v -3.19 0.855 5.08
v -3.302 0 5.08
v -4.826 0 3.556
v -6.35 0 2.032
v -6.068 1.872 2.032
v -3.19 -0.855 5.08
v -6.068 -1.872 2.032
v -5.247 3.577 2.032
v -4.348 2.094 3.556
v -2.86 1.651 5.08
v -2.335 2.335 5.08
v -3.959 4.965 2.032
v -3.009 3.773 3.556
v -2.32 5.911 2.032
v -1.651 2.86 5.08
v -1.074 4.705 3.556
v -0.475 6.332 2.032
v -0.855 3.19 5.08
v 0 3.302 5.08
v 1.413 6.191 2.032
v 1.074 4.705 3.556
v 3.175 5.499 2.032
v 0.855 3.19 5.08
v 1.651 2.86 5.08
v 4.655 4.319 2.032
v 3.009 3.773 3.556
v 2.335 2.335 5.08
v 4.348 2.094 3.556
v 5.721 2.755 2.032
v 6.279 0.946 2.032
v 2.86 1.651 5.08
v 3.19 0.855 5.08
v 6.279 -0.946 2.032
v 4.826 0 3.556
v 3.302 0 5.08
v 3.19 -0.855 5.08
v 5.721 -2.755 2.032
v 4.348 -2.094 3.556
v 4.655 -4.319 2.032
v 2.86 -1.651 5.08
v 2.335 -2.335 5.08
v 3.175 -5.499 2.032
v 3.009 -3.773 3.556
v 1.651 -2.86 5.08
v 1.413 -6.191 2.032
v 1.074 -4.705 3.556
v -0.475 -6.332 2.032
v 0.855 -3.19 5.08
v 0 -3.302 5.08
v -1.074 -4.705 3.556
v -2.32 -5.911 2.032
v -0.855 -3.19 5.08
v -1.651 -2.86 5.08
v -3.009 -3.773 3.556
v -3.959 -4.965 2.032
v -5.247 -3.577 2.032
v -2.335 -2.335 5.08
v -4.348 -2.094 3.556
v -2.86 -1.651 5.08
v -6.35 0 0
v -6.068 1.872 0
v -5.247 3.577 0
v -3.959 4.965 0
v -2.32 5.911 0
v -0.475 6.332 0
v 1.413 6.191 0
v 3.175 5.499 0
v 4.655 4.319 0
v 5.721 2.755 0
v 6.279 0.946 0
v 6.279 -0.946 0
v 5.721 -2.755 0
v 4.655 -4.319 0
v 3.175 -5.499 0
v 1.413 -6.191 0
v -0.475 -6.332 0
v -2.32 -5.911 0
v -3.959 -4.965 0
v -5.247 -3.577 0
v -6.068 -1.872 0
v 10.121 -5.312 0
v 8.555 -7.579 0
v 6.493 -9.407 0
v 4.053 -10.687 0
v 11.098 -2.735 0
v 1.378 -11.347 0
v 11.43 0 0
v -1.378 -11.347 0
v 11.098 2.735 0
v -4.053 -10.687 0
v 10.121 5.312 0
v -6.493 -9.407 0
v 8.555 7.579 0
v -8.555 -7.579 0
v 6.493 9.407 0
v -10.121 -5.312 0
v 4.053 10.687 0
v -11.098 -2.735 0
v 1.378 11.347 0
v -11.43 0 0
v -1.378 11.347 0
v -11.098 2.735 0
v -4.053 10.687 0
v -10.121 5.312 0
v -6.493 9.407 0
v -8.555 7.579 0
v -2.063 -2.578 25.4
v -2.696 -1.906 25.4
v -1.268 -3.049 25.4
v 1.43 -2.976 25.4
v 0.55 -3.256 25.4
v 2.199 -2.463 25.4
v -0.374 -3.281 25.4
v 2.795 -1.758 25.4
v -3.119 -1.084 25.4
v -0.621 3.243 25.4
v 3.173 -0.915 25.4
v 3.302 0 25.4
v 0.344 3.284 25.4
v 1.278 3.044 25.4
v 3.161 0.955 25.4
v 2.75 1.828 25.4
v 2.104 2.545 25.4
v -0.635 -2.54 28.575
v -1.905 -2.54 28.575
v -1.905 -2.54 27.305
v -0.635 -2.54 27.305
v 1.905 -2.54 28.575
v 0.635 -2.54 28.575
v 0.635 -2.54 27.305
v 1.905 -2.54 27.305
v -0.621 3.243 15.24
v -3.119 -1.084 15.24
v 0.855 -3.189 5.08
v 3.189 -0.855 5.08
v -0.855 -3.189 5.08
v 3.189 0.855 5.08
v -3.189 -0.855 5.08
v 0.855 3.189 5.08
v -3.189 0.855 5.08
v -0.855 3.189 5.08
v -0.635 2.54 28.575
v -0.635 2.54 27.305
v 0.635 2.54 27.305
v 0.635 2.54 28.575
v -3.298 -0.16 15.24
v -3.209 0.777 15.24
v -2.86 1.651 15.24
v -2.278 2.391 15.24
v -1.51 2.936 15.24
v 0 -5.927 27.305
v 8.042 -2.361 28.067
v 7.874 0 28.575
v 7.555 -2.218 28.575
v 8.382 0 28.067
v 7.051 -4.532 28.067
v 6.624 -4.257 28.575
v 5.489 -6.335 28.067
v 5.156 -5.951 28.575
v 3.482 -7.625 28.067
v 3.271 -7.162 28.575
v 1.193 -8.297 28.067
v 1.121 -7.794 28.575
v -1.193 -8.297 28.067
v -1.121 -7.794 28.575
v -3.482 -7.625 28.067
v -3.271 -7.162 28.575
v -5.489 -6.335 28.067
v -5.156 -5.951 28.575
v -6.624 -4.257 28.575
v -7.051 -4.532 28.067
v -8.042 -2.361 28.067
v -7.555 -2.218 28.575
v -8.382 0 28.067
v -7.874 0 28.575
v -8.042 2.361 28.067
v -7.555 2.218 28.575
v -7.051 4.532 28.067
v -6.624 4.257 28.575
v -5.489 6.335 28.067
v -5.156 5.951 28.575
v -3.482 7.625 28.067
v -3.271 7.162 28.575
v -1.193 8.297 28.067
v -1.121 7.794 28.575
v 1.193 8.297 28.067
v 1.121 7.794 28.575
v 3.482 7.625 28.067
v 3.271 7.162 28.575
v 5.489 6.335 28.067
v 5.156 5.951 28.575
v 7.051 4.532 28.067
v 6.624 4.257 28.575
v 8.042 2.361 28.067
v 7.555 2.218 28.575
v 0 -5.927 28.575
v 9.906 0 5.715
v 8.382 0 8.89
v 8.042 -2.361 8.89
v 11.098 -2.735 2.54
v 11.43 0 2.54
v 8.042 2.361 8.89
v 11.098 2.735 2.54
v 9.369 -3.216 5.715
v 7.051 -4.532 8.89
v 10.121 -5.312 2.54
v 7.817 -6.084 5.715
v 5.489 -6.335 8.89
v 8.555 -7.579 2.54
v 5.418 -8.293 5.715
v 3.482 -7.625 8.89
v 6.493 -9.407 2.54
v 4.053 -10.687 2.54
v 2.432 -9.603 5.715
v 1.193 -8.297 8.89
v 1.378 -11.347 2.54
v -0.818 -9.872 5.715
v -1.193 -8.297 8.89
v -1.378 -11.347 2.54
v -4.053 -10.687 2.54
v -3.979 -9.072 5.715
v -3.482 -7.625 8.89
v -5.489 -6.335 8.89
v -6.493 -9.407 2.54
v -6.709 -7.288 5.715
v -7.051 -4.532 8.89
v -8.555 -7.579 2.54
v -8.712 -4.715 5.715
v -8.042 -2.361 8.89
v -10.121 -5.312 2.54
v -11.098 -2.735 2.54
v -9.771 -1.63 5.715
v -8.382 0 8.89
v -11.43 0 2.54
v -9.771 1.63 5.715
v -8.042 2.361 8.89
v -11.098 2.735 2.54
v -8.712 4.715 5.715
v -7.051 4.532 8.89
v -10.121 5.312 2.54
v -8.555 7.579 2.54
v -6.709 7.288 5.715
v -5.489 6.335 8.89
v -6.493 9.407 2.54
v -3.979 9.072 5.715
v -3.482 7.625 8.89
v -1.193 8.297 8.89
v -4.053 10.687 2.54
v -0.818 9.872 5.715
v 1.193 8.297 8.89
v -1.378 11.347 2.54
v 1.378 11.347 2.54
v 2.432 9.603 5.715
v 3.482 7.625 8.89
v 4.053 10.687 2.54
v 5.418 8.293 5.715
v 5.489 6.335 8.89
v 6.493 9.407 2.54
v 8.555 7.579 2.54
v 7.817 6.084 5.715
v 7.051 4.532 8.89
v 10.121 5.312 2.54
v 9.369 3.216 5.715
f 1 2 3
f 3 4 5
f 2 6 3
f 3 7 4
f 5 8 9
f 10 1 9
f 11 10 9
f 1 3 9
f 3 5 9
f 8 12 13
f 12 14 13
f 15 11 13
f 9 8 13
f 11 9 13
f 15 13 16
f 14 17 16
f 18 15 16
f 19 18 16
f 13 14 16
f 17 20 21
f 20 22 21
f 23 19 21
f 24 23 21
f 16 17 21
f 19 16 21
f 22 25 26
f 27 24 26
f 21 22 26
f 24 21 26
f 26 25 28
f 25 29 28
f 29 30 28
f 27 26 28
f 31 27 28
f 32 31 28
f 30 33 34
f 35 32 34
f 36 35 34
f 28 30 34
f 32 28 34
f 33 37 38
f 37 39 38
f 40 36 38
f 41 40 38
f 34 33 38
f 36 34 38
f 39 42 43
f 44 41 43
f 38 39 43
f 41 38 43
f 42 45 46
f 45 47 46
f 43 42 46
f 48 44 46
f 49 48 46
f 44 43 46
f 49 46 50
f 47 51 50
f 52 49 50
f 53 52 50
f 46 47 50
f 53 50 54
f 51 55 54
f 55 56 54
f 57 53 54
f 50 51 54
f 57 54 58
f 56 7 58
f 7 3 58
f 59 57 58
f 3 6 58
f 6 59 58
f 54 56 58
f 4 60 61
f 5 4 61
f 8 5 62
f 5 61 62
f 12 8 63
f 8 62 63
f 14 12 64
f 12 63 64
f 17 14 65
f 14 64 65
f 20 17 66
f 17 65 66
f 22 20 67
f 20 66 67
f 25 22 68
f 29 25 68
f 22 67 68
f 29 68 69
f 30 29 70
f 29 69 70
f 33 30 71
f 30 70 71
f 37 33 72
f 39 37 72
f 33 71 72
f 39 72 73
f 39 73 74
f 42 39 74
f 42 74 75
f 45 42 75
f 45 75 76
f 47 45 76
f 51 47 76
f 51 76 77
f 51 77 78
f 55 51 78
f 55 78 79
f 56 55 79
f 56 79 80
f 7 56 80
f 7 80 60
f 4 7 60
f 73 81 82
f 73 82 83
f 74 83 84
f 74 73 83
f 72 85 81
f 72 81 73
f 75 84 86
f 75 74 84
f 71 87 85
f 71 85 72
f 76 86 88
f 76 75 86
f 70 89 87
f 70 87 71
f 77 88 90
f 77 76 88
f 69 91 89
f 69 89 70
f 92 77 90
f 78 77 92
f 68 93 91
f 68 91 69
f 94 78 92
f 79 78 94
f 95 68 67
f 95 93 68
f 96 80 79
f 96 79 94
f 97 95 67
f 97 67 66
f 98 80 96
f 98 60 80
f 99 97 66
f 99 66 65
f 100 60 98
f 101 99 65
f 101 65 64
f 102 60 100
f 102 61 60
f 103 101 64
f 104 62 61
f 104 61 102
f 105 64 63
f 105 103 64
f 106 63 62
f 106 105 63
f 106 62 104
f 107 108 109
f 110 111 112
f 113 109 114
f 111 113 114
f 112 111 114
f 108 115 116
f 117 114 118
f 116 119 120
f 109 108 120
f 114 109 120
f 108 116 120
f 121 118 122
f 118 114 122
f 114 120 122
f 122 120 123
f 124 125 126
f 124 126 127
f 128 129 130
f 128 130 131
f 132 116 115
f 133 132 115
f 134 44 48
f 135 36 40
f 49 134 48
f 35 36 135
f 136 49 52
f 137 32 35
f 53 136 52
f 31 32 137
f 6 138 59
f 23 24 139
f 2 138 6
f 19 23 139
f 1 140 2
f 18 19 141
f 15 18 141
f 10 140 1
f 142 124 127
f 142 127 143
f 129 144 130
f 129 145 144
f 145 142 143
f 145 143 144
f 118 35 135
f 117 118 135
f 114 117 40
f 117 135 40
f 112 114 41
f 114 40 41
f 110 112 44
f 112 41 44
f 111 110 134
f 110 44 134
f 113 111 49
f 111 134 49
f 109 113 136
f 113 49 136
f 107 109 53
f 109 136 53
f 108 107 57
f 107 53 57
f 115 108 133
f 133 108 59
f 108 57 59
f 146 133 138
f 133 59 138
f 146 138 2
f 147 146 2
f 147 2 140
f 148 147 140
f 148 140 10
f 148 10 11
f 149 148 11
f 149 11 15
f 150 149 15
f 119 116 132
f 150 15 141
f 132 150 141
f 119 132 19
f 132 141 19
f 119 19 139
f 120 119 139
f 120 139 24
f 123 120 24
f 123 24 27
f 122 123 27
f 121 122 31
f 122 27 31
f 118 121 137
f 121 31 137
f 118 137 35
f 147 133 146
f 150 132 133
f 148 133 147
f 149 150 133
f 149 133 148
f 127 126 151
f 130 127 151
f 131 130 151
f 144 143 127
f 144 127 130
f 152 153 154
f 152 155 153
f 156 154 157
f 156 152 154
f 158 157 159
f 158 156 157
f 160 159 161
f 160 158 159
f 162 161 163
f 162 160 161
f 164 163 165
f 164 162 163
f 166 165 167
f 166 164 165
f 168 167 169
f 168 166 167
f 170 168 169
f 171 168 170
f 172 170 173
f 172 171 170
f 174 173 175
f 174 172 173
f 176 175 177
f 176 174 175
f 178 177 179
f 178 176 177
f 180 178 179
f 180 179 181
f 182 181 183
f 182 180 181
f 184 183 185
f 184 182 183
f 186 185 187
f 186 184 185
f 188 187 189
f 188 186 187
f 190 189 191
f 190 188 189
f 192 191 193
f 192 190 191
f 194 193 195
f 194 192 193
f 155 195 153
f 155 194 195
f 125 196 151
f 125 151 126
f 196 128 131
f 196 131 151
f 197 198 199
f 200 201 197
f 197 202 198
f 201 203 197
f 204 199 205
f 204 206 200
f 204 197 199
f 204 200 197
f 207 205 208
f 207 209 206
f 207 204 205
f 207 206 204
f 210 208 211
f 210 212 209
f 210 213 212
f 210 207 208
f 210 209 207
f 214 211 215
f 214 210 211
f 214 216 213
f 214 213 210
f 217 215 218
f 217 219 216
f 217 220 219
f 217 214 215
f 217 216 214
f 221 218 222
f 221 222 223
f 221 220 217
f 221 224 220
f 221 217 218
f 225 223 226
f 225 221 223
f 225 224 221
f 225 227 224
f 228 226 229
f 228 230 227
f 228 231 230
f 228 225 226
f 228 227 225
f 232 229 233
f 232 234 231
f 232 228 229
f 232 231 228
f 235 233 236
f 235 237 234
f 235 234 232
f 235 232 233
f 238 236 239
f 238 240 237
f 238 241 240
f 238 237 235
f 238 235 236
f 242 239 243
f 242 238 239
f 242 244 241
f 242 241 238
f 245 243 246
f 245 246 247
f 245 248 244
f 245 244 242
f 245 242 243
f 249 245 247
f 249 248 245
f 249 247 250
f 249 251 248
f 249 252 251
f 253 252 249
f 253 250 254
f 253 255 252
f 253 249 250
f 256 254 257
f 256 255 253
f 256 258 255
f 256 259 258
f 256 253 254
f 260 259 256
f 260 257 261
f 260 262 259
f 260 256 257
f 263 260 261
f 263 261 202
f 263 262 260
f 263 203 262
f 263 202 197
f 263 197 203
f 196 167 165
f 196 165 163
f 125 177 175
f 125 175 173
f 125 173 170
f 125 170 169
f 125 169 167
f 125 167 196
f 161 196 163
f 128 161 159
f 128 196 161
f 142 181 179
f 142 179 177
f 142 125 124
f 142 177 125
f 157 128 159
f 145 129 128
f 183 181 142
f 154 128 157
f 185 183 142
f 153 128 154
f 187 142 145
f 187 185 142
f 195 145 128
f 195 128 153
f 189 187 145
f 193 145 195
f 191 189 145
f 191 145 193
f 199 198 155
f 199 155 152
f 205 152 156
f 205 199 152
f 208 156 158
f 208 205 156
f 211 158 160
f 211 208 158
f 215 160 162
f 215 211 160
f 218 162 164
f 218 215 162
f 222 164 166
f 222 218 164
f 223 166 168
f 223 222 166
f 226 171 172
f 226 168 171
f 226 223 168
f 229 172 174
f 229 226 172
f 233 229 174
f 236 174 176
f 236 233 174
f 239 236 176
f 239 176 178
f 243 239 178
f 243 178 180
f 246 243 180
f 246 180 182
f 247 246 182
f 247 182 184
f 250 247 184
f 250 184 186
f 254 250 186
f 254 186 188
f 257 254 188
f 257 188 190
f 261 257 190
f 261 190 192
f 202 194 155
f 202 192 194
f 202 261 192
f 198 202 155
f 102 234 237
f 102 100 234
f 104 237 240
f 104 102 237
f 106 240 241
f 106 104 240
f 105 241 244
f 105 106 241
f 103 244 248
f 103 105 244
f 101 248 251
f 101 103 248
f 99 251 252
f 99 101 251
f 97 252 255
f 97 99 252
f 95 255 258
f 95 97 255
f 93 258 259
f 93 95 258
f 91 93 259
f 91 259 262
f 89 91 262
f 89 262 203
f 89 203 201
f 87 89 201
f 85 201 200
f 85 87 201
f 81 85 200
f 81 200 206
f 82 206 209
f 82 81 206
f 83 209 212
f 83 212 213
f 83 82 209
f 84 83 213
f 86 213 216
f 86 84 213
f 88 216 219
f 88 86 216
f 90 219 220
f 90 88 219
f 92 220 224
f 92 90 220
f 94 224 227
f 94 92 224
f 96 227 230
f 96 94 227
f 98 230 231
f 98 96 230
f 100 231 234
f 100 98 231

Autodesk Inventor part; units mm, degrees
ref_plane "YZ Plane" through (0, 0, 0) normal (1, 0, 0) x (0, 1, 0)
ref_plane "XZ Plane" through (0, 0, 0) normal (0, 1, 0) x (-1, 0, 0)
ref_plane "XY Plane" through (0, 0, 0) normal (0, 0, 1) x (1, 0, 0)
sketch "Sketch1" plane through (0, 0, 0) normal (0, 0, 1) x (1, 0, 0)
  circle A0 centre (0, 0) radius 2.9845
  circle A1 centre (0, 0) radius 8.382
  circle A2 centre (0, 0) radius 3.302
  dimension "d0" = 5.969
  dimension "d2" = 0.3175
  dimension "d5" = 5.08
extrude "Extrusion1" add sketch "Sketch1" along normal blind 25.4 contours A1
sketch "Sketch2" plane through (0, 0, 25.4) normal (0, 0, 1) x (1, 0, 0)
  circle A0 centre (0, 0) radius 8.382 projected
extrude "Extrusion2" add sketch "Sketch2" along normal blind 3.175
sketch "Sketch3" plane through (0, 0, 28.575) normal (0, 0, 1) x (1, 0, 0)
  line L0 (0.635, -2.54) -> (-0.635, -2.54)
  line L1 (-0.635, -2.54) -> (-0.635, 2.54)
  line L2 (-0.635, 2.54) -> (0.635, 2.54)
  line L3 (0.635, 2.54) -> (0.635, -2.54)
  line L4 (0.635, -2.54) -> (-0.635, 2.54) construction
  line L5 (-0.635, -2.54) -> (0.635, 2.54) construction
  line L6 (0, 2.54) -> (0, -2.54) construction
  line L7 (-1.905, -2.54) -> (1.905, -2.54)
  line L8 (1.905, -2.54) -> (0, -5.9267)
  line L9 (0, -5.9267) -> (-1.905, -2.54)
  point P0 (0, 0)
  dimension "d8" = 5.08
  dimension "d10" = 1.27
  dimension "d11" = 3.81
  dimension "d45" = 3.3867
extrude "Extrusion3" cut sketch "Sketch3" against normal blind 1.27
chamfer "Chamfer1" distance 0.508 angle 45 1 edges at (-8.382, 0, 28.575)
sketch "Sketch6" plane through (0, 0, 25.4) normal (0, 0, -1) x (-1, 0, 0)
  circle A0 centre (0, 0) radius 3.302 projected
  line L0 (0.6206, 3.2432) -> (3.1189, -1.0842)
  line L1 (3.1189, 1.0842) -> (0.6206, -3.2432) construction
  line L2 (0, 0) -> (3.302, 0) construction
  circle A1 centre (0, 0) radius 3.302 construction
  line L3 (0, 0) -> (2.8596, -1.651) construction
  line L4 (0, 0) -> (2.8596, 1.651) construction
  line L5 (-1.3144, 4.3273) -> (-3.8128, 0) construction
  arc A2 (0.6206, -3.2432) -> (3.1189, 1.0842) centre (0, 0) ccw
  arc A3 (3.1189, -1.0842) -> (0.6206, 3.2432) centre (0, 0) ccw
  circle A4 centre (0, 0) radius 3.302 projected
  dimension "d24" = 60
  dimension "d26" = 5.461
extrude "Extrusion6" add sketch "Sketch6" along normal blind 10.16 contours A0 L0 picked at (2.0493, 1.4727)
sketch "Sketch10" plane through (0, 0, 0) normal (0, 0, -1) x (-1, 0, 0)
  circle A0 centre (0, 0) radius 6.35
  circle A1 centre (0, 0) radius 11.43
  circle A2 centre (0, 0) radius 3.302 construction
  circle A3 centre (0, 0) radius 8.382 construction
  dimension "d49" = 12.7
  dimension "d50" = 5.08
  dimension "d51" = 5.08
extrude "Extrusion10" add sketch "Sketch10" against normal blind 2.54
chamfer "Chamfer3" distance 6.35 distance2 3.048 1 edges at (-8.382, 0, 2.54) measured on face at (8.2735, 1.3446, 11.049)
sketch "Sketch11" plane through (0, 0, 0) normal (0, 0, -1) x (-1, 0, 0)
  circle A0 centre (0, 0) radius 6.35
  dimension "d57" = 12.7
extrude "Extrusion11" cut sketch "Sketch11" against normal blind 5.08
chamfer "Chamfer4" distance 3.048 angle 45 1 edges at (6.35, 0, 5.08)
equation "\"d11\" = 3 * d10"
equation "\"d45\" = 0.666667 * d8"
equation "\"d51\" = d50"
properties part number "potcap"
